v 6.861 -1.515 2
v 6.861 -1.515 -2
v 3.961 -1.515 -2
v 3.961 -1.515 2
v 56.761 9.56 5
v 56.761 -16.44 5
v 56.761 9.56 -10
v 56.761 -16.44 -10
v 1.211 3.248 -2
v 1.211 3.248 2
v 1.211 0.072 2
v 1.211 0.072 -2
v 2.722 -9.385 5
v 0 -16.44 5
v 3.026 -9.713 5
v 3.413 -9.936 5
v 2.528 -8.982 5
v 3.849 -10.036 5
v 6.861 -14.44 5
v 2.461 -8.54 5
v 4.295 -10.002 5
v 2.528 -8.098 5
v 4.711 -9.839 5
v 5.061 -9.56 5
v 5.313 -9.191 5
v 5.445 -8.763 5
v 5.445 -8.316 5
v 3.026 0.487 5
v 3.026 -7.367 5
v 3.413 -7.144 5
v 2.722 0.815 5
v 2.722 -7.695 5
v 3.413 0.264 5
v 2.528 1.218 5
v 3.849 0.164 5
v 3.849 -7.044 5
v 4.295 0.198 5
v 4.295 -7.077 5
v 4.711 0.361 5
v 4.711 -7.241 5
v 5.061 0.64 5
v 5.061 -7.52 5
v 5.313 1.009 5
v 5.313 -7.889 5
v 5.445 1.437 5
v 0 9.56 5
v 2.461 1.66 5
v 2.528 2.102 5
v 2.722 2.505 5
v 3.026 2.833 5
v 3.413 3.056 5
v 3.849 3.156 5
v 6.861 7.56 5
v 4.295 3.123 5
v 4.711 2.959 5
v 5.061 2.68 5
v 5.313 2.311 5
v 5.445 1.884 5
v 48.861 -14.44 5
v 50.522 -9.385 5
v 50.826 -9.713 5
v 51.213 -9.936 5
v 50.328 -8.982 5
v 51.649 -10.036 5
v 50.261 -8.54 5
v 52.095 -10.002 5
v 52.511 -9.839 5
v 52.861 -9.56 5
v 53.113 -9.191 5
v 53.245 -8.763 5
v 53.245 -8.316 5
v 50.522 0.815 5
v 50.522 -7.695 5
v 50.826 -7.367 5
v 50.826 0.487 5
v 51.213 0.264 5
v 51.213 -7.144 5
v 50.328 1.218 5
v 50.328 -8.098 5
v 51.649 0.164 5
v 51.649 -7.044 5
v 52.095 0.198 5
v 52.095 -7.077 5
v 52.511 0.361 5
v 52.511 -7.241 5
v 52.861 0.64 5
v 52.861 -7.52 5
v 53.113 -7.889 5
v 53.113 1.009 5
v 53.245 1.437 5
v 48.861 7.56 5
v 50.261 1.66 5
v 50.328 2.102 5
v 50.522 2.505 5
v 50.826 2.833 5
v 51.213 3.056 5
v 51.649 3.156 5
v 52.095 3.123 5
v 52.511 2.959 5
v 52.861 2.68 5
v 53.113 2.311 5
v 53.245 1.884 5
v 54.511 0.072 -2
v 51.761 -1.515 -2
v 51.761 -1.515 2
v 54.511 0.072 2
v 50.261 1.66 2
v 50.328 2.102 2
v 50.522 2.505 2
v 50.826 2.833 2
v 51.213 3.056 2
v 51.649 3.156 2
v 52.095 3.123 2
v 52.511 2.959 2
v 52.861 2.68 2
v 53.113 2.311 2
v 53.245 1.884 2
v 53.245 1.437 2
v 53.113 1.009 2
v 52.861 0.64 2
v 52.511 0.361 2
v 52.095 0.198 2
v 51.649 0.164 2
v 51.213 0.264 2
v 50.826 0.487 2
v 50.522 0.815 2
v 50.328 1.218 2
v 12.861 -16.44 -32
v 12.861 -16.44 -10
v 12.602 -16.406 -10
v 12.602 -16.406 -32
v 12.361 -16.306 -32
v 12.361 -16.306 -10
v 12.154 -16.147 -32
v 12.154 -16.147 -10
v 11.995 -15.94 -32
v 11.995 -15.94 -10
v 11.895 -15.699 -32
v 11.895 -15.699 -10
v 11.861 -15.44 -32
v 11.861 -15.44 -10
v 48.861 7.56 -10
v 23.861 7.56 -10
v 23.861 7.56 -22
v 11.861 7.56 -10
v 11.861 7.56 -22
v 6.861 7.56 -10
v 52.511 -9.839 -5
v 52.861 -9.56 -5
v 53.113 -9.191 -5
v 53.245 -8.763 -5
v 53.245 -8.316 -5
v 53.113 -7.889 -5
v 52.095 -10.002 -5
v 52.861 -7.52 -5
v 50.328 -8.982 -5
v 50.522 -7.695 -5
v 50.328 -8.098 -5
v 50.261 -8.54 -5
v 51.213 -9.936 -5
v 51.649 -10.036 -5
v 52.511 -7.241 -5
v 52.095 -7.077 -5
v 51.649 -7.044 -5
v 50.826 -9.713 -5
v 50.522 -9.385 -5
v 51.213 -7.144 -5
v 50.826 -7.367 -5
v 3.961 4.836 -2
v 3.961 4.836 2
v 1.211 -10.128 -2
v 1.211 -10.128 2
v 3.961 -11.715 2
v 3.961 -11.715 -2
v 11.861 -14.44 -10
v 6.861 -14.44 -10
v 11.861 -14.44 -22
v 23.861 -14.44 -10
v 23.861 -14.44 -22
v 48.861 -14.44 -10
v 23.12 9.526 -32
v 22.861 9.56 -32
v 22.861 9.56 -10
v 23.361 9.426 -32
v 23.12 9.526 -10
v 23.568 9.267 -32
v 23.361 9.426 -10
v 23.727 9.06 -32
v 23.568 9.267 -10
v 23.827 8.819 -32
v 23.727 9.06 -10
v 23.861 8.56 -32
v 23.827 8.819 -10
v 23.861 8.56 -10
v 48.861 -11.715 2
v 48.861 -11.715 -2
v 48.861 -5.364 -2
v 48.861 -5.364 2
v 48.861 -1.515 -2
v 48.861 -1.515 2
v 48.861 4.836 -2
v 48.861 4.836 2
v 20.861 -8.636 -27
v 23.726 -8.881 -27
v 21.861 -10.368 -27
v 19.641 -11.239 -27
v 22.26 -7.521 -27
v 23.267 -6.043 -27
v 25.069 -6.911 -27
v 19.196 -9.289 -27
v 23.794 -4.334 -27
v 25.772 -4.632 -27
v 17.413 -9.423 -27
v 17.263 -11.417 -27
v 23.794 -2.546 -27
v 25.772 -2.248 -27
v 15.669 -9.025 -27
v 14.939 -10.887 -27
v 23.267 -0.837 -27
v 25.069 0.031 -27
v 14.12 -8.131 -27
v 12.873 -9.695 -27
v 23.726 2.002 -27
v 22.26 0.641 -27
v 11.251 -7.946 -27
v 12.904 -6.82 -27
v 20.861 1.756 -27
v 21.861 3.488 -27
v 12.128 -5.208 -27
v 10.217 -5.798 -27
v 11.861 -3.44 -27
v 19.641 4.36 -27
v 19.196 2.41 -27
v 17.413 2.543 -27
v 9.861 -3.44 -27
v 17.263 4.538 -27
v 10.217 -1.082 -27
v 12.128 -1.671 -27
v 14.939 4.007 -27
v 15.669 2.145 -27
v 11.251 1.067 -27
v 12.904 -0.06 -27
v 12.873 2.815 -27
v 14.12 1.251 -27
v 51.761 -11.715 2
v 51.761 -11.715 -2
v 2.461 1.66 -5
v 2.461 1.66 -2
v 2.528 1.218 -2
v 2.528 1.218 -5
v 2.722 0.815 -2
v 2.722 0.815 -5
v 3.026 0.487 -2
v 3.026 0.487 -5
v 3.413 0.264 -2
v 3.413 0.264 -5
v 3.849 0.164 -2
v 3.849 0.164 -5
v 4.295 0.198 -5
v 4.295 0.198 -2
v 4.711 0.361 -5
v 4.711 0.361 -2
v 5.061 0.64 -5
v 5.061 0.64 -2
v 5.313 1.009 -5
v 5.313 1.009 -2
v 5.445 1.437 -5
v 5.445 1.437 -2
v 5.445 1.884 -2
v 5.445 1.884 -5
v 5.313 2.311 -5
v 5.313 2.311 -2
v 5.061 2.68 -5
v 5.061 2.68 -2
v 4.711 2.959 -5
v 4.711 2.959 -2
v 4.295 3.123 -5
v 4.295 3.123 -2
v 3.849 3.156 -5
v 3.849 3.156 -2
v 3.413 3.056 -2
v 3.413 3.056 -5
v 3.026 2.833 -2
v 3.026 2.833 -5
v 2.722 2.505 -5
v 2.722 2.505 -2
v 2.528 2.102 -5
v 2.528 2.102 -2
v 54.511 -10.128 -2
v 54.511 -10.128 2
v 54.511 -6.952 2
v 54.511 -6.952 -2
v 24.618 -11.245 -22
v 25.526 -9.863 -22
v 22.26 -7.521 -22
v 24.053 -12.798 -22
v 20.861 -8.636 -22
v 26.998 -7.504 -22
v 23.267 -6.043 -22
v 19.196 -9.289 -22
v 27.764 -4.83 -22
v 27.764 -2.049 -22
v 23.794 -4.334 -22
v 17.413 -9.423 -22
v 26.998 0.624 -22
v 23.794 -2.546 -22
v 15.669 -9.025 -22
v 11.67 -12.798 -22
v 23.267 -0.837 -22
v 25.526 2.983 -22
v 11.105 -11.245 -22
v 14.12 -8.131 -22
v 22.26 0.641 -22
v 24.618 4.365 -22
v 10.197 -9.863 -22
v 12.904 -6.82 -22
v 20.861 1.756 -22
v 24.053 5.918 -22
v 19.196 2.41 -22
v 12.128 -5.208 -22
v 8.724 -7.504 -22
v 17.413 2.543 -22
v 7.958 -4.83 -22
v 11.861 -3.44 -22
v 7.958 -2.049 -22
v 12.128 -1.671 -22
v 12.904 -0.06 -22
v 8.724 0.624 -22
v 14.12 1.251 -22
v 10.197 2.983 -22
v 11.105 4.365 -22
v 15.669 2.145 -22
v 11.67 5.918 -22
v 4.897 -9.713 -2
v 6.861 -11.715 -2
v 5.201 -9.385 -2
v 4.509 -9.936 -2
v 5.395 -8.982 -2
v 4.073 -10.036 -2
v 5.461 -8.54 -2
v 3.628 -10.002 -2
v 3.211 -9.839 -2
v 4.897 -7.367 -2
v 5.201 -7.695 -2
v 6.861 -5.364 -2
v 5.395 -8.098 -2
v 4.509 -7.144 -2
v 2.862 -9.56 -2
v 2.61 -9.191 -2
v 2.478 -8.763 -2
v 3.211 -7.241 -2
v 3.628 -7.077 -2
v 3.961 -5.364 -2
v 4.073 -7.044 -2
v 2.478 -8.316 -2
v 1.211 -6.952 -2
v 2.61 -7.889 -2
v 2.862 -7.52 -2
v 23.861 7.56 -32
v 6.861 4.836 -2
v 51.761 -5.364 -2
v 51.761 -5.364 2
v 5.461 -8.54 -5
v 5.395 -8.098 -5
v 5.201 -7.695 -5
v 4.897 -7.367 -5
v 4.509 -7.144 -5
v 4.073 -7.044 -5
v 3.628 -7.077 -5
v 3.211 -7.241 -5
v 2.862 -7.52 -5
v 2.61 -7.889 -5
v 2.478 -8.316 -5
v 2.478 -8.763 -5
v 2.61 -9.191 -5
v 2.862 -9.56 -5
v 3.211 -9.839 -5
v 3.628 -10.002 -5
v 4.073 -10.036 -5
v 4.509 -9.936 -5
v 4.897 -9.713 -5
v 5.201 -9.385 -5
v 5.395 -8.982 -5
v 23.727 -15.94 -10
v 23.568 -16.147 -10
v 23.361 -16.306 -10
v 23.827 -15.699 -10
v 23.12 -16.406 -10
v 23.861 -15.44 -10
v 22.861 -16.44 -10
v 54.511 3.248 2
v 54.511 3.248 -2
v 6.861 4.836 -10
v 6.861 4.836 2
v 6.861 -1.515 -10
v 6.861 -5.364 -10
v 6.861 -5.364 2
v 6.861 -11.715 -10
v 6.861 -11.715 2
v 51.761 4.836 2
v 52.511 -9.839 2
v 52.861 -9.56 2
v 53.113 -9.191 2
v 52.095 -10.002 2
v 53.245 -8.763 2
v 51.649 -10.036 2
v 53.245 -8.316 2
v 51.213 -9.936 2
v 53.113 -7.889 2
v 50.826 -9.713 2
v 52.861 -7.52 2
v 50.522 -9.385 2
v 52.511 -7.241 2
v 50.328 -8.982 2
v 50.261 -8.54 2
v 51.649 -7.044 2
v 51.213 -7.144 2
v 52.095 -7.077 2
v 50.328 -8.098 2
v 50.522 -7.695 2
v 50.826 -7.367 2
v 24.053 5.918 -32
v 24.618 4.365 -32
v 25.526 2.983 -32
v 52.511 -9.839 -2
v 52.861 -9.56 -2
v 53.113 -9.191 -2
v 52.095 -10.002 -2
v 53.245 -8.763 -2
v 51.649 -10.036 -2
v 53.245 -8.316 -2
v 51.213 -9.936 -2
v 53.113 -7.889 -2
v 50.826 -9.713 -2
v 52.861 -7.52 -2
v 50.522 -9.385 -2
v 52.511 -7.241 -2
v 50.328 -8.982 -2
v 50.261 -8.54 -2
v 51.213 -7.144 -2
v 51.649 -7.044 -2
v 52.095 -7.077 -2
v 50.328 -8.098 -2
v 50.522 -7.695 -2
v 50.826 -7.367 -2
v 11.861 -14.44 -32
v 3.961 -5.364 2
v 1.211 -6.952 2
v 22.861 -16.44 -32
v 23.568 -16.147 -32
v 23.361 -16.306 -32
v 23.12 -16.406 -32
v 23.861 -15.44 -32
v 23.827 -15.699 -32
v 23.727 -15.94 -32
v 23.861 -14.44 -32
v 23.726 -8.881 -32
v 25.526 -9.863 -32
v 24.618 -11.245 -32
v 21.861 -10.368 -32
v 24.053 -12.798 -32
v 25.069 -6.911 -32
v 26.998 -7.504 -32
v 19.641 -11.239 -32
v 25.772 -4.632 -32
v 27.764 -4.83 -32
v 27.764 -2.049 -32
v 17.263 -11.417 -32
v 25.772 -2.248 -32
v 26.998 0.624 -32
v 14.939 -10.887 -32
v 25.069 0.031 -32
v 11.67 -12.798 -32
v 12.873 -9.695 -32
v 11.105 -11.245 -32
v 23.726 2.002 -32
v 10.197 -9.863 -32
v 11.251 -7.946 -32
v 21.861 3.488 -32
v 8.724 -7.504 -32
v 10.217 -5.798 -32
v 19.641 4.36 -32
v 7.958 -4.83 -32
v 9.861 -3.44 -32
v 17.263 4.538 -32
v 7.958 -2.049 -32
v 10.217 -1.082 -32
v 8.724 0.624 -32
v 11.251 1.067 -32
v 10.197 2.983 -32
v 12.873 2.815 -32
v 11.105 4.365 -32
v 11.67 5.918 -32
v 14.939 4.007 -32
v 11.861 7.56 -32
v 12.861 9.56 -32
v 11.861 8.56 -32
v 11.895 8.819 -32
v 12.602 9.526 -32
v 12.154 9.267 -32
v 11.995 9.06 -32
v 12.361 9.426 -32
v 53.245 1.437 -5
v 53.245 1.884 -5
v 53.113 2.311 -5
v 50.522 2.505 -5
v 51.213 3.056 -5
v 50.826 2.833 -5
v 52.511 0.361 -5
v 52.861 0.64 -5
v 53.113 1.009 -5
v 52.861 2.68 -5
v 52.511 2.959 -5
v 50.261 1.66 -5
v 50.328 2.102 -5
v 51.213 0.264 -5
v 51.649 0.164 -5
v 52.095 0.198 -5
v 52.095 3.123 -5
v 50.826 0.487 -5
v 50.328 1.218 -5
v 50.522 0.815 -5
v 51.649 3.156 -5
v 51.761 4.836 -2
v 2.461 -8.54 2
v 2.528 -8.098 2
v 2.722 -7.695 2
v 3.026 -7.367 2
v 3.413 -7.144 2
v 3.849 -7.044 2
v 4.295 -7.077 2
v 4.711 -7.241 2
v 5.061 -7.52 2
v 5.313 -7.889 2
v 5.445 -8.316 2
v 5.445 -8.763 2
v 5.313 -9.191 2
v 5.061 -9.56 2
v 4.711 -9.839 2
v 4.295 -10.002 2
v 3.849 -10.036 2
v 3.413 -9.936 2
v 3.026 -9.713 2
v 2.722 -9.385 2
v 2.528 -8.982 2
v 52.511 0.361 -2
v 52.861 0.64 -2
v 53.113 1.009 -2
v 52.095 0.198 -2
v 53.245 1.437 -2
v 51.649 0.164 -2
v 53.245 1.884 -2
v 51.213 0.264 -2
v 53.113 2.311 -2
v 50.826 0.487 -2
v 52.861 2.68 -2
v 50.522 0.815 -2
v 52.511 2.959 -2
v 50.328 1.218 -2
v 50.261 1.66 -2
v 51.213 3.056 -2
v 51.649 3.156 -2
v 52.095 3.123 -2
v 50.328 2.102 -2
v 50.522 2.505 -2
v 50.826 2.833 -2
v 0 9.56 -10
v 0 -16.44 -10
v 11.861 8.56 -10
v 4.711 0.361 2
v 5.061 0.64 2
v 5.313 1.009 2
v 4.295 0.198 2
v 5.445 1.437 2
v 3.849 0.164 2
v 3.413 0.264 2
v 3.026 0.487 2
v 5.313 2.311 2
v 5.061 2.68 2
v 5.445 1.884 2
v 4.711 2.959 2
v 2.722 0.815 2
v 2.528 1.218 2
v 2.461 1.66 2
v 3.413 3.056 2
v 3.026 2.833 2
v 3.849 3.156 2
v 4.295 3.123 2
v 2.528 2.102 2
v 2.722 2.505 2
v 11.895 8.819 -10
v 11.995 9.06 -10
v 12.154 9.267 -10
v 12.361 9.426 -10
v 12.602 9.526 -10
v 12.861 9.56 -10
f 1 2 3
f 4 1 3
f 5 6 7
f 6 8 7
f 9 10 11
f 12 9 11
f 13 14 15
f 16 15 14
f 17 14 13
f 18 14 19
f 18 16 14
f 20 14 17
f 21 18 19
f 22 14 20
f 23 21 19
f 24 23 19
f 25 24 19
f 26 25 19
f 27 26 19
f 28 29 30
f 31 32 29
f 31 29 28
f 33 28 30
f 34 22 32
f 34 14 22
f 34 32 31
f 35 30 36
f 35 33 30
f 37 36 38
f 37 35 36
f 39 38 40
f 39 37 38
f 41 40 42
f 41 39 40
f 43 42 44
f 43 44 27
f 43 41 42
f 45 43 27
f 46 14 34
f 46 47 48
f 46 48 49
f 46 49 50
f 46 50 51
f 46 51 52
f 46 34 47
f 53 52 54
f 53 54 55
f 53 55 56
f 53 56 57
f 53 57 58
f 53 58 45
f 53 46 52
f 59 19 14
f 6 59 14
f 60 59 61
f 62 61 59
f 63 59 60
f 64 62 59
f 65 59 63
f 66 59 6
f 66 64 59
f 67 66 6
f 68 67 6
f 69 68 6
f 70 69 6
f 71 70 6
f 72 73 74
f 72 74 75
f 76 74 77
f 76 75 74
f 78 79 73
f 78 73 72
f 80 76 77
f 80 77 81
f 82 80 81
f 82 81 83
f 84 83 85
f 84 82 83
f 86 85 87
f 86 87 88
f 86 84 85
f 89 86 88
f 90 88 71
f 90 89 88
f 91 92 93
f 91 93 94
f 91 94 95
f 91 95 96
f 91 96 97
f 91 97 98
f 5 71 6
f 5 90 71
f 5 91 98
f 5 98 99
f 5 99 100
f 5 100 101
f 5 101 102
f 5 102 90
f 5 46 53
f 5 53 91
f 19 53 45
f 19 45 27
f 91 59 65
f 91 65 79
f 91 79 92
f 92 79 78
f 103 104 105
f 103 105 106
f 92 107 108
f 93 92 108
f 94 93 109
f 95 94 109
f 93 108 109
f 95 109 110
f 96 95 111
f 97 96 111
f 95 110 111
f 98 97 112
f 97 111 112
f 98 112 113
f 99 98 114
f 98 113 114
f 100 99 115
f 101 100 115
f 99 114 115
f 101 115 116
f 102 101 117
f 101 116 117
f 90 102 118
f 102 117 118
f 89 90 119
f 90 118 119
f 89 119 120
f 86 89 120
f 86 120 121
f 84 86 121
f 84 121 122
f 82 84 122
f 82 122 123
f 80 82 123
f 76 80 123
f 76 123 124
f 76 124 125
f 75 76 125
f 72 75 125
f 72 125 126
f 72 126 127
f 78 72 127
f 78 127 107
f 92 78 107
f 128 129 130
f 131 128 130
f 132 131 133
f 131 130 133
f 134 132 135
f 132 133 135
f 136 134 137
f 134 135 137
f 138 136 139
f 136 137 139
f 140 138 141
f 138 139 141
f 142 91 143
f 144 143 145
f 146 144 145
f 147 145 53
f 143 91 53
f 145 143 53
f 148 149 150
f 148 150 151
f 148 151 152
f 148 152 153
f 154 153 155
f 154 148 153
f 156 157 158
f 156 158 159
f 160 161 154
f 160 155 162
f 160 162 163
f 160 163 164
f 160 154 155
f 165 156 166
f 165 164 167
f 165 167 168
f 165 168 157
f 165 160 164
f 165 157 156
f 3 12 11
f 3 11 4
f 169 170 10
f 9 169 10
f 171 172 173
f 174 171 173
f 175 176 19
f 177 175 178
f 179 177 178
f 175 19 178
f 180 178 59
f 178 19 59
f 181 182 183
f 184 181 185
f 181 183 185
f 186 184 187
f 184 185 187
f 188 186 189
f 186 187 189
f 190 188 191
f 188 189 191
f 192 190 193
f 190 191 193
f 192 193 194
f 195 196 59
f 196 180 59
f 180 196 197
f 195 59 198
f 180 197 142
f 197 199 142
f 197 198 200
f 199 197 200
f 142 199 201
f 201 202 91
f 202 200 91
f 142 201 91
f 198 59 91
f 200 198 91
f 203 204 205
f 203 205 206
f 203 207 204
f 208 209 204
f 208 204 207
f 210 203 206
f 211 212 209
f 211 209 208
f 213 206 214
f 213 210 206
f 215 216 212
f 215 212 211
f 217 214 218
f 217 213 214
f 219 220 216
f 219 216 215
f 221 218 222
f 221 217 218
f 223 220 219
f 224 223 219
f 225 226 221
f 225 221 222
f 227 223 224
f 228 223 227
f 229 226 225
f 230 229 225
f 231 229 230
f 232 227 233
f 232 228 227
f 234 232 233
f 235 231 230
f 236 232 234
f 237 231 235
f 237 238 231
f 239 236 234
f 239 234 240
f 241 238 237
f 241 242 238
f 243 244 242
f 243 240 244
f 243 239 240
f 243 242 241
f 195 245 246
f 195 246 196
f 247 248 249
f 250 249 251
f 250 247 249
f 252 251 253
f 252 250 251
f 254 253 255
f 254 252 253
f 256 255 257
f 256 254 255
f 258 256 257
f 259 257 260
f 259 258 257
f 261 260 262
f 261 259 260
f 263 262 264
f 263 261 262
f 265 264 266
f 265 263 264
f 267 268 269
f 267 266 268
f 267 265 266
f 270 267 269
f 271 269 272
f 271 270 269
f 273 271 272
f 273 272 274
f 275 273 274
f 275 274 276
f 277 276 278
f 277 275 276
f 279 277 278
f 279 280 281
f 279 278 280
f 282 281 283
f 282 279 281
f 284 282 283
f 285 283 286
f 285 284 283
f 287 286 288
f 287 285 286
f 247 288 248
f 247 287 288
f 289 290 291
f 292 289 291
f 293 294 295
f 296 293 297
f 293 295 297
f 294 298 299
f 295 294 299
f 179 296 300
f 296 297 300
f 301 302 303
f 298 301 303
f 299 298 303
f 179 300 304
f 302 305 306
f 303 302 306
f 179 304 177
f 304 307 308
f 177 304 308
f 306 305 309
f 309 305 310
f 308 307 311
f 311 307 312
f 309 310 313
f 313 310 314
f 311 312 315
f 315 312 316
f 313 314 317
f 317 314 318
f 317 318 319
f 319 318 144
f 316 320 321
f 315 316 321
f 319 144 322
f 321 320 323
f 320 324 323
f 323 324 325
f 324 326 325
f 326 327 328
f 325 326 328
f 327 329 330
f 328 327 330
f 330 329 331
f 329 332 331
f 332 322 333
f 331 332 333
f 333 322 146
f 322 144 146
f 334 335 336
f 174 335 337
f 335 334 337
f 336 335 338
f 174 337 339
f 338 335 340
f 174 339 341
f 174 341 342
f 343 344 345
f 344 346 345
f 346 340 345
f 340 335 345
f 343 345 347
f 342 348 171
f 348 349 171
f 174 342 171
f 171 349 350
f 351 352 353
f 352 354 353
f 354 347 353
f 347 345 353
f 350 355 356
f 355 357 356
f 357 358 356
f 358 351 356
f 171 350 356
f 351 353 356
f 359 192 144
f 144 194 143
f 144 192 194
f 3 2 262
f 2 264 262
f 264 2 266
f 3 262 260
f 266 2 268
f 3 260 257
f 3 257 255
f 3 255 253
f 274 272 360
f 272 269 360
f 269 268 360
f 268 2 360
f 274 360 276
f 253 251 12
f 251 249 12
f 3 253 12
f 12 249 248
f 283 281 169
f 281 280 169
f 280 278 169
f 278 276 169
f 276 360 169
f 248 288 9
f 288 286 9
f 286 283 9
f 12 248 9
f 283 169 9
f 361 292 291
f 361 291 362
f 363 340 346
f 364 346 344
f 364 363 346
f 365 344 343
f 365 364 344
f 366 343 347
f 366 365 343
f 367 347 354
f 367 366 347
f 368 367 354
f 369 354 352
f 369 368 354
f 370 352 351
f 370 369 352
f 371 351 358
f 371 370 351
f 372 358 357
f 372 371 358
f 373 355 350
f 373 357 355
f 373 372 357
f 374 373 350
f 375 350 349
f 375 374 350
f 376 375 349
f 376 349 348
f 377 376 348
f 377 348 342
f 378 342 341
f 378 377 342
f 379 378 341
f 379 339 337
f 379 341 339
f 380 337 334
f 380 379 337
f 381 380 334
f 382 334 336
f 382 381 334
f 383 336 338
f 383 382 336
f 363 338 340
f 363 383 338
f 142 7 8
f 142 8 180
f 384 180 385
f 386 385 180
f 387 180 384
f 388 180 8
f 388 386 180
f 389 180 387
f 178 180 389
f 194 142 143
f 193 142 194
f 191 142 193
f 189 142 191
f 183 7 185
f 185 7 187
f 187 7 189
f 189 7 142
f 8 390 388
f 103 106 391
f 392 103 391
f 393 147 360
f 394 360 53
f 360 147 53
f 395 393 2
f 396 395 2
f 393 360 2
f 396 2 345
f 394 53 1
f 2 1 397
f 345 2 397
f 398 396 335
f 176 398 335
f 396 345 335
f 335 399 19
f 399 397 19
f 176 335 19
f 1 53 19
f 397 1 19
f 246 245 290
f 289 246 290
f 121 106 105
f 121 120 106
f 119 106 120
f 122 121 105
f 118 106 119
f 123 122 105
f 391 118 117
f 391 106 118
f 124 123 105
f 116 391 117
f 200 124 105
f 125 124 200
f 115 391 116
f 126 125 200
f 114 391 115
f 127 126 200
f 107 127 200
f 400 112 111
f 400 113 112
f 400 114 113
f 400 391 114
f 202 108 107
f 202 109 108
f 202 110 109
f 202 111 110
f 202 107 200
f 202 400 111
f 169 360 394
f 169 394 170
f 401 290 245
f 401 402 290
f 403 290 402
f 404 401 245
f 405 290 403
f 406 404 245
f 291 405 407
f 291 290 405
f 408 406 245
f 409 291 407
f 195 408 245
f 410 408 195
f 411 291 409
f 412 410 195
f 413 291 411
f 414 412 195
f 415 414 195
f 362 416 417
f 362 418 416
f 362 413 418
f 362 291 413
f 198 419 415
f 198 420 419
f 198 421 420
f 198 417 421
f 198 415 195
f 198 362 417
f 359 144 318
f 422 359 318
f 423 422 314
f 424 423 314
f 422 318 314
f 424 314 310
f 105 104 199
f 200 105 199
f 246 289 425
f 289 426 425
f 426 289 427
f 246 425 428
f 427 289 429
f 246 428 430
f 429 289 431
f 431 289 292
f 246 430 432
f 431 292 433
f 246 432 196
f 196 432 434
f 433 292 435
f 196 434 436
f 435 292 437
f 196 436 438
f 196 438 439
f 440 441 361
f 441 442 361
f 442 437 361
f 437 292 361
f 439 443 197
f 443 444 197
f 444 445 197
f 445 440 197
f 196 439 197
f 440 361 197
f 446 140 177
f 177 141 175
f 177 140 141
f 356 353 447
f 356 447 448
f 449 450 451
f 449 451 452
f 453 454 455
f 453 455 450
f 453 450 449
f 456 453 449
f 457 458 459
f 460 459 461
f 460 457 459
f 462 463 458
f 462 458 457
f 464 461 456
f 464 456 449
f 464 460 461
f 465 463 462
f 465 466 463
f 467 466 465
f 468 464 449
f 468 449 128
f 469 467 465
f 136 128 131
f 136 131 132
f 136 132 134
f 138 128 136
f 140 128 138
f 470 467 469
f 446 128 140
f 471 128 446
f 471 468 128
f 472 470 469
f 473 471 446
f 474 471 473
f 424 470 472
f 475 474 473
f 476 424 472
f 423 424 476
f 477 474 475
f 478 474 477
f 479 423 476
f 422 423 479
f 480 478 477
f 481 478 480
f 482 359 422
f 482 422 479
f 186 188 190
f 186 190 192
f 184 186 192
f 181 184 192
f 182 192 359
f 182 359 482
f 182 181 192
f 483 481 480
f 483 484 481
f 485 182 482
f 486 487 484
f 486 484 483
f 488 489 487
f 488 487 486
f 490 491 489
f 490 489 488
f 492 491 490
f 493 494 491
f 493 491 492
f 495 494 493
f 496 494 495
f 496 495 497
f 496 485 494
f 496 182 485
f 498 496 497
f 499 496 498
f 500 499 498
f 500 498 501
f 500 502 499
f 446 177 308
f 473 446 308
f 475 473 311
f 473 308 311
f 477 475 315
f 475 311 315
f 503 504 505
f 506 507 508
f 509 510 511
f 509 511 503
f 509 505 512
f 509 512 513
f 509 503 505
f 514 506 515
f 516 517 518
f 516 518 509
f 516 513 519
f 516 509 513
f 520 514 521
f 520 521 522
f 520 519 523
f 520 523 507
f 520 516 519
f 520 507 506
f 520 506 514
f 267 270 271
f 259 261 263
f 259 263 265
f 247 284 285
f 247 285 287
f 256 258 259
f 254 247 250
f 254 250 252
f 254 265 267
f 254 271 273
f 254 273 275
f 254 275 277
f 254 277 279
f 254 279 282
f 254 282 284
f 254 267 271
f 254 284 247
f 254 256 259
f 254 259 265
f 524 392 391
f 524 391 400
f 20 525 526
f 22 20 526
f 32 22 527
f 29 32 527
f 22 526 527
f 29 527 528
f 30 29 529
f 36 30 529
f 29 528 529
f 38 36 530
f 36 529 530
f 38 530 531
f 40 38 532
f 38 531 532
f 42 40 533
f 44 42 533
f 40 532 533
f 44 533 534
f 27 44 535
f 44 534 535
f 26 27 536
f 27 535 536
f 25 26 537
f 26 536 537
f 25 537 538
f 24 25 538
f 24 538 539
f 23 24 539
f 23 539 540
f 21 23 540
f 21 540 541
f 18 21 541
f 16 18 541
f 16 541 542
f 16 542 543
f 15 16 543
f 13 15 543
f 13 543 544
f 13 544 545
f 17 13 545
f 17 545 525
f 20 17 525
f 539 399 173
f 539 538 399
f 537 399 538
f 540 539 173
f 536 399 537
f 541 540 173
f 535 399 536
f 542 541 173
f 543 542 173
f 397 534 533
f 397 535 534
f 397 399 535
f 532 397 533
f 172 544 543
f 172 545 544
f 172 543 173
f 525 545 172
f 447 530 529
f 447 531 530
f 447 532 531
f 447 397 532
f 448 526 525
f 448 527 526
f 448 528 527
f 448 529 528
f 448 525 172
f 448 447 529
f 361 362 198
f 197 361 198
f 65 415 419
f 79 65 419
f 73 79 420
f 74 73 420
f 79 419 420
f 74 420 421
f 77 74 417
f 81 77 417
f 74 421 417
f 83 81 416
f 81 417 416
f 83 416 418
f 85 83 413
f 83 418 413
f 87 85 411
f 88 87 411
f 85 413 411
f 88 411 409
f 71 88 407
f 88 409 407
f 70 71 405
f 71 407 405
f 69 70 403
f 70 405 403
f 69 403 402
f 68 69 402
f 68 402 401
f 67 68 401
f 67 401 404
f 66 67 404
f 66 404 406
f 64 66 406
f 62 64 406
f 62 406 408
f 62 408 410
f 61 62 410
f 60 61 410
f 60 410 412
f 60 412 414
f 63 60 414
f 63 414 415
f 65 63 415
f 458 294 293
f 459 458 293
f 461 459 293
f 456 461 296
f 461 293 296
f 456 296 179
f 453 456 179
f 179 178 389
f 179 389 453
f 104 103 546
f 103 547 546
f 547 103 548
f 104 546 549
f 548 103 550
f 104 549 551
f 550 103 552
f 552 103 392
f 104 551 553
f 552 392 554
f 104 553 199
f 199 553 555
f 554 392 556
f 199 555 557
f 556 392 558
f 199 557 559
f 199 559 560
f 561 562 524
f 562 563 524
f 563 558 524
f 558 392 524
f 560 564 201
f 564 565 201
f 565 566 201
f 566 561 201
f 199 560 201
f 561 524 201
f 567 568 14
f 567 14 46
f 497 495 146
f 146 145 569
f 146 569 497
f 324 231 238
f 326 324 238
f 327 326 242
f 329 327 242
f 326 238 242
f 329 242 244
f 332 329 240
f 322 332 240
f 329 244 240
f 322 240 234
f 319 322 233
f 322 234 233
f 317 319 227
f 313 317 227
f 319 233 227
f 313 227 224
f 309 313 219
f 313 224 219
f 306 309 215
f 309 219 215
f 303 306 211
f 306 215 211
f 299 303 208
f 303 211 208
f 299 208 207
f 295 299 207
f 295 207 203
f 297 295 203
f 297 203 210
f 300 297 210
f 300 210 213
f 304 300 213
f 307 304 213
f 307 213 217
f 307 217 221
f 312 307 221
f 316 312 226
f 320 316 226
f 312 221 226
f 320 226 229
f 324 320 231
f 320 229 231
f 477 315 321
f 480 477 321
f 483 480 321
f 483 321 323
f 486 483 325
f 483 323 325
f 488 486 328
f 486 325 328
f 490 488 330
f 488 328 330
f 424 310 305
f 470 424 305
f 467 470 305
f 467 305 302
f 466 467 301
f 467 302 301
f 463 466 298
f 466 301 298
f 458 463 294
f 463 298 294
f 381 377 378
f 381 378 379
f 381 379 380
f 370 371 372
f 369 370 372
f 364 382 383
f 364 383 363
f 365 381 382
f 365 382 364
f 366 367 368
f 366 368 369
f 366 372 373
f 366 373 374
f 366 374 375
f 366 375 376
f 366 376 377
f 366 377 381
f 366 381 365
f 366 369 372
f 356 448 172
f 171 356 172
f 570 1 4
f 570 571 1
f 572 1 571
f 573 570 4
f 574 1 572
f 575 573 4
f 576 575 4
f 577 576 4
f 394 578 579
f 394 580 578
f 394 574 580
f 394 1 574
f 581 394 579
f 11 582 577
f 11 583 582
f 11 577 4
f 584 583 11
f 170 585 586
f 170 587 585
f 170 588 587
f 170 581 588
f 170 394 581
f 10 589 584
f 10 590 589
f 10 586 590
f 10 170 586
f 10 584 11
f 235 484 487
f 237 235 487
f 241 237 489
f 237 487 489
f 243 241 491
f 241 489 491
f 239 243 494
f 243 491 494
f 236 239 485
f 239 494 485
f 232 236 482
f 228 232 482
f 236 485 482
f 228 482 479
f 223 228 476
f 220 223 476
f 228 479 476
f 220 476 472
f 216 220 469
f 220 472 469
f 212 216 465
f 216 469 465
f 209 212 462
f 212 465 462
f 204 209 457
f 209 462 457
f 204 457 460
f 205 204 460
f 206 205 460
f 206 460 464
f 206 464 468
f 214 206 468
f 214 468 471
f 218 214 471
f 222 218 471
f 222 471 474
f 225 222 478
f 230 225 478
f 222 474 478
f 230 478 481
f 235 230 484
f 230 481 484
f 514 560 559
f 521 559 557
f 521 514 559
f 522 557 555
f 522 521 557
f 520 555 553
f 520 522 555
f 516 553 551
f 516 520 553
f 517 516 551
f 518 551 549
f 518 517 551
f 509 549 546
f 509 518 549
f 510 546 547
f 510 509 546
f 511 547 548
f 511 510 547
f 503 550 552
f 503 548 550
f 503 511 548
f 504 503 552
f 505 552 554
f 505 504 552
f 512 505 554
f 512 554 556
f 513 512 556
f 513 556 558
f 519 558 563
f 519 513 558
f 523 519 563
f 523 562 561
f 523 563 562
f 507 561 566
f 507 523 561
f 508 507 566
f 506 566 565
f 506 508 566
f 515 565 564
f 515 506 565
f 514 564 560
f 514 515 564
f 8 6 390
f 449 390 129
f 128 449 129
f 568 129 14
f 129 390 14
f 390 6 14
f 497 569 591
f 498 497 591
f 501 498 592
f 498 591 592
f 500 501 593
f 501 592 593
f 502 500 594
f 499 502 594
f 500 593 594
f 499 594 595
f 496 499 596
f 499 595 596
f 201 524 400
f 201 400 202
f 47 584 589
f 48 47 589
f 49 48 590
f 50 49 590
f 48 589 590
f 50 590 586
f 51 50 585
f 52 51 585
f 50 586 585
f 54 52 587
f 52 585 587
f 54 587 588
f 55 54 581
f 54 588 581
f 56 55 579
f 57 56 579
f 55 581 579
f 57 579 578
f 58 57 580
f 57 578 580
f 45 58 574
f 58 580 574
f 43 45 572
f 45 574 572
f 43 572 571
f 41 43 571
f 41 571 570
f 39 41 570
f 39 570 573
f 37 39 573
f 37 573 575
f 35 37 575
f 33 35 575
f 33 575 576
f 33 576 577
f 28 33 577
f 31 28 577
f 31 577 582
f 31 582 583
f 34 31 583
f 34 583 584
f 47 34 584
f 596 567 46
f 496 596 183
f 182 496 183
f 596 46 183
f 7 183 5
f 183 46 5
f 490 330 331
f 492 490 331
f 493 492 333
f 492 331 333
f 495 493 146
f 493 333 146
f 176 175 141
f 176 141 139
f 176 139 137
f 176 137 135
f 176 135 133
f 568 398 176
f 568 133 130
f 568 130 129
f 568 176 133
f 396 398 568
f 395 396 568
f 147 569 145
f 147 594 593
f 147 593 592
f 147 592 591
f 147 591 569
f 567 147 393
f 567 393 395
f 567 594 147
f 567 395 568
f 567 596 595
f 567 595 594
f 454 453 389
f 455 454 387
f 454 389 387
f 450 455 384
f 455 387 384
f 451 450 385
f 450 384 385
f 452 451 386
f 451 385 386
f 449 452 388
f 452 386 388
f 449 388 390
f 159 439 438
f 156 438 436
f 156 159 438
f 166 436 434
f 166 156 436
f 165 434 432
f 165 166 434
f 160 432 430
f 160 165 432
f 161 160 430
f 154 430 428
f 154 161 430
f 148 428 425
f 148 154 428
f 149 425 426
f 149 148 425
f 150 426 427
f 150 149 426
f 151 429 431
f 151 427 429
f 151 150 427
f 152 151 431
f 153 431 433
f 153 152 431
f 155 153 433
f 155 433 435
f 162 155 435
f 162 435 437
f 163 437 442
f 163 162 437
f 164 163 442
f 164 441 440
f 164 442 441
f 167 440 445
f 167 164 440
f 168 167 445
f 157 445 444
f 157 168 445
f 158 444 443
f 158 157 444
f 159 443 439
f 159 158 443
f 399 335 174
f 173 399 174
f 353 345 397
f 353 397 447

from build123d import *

# Parameters (mm, degrees)
ESQUISSE1_W                   = 80
ESQUISSE1_H                   = 26
BOSS_EXTRU_1_DEPTH            = 5
ESQUISSE4_W                   = 15
ESQUISSE4_H                   = 21
BOSS_EXTRU_2_DEPTH            = 23
ESQUISSE6_R                   = 1.9
ENL_V_MAT_EXTRU_1_DEPTH       = 23
ESQUISSE7_R                   = 2.5
ENL_V_MAT_EXTRU_2_DEPTH       = 33
ESQUISSE8_W                   = 23.844388633
ESQUISSE8_H                   = 15
ENL_V_MAT_EXTRU_3_DEPTH       = 20
ENL_V_MAT_EXTRU_4_DEPTH       = 20
ENL_V_MAT_EXTRU_5_DEPTH       = 25
ENL_V_MAT_EXTRU_7_DEPTH       = 25
ENL_V_MAT_EXTRU_8_DEPTH       = 1
BOSS_EXTRU_3_DEPTH            = 2
ESQUISSE15_R                  = 1.5
ENL_V_MAT_EXTRU_9_DEPTH       = 19
ESQUISSE17_W                  = 42
ESQUISSE17_H                  = 22
ENL_V_MAT_EXTRU_11_DEPTH      = 19
ENL_V_MAT_EXTRU_12_DEPTH      = 2
BOSS_EXTRU_4_DEPTH            = 22
BOSS_EXTRU_5_DEPTH            = 10
ESQUISSE25_R                  = 8
ENL_V_MAT_EXTRU_13_DEPTH      = 5
ESQUISSE26_R                  = 6
ENL_V_MAT_EXTRU_14_DEPTH      = 5
BOSS_EXTRU_7_DEPTH            = 10
ESQUISSE35_W                  = 3.859922035
ESQUISSE35_H                  = 6.350852961
ESQUISSE35_W_2                = 3.756368621
ESQUISSE35_W_3                = 10.8376001
ESQUISSE35_W_4                = 8.369035633
ENL_V_MAT_EXTRU_17_DEPTH      = 12
ESQUISSE37_W                  = 8.298839711
ESQUISSE37_H                  = 26
BOSS_EXTRU_8_DEPTH            = 8
BOSS_EXTRU_9_DEPTH            = 21
ENL_V_START                   = -10
ESQUISSE42_R                  = 1.5
ENL_V_MAT_EXTRU_18_DEPTH      = 10
ENL_V_MAT_EXTRU_19_DEPTH      = 70.721697714
ENL_V_MAT_EXTRU_19_DEPTH_BACK = 70.721697714
ESQUISSE43_W                  = 41.770498162
ESQUISSE43_H                  = 26


with BuildPart() as part:
    # Esquisse1 → Boss.-Extru.1 (new body)
    with BuildSketch(Plane.XY):
        with Locations((16.761307699, -3.439862543)):
            Rectangle(ESQUISSE1_W, ESQUISSE1_H)
    extrude(amount=BOSS_EXTRU_1_DEPTH)

    # Esquisse4 → Boss.-Extru.2 (add)
    with BuildSketch(Plane(origin=(0, 0, 0), x_dir=(-1, 0, 0), z_dir=(0, 0, -1))):
        with Locations((30.738692301, -3.439862543)):
            Rectangle(ESQUISSE4_W, ESQUISSE4_H)
    extrude(amount=-BOSS_EXTRU_2_DEPTH)

    # Esquisse6 → Enlèv. mat.-Extru.1 (cut)
    with BuildSketch(Plane.XZ.offset(13.939862543)):
        with Locations((-28.738692301, 5)):
            Circle(ESQUISSE6_R)
    extrude(amount=-ENL_V_MAT_EXTRU_1_DEPTH, mode=Mode.SUBTRACT)

    # Esquisse7 → Enlèv. mat.-Extru.2 (cut)
    with BuildSketch(Plane.XY.offset(23)):
        with Locations((-33.238692301, -3.439862543)):
            Circle(ESQUISSE7_R)
    extrude(amount=-ENL_V_MAT_EXTRU_2_DEPTH, mode=Mode.SUBTRACT)

    # Esquisse8 → Enlèv. mat.-Extru.3 (cut)
    with BuildSketch(Plane(origin=(0, 0, 0), x_dir=(-1, 0, 0), z_dir=(0, 0, -1))):
        with Locations((38.160886617, -3.439862543)):
            Rectangle(ESQUISSE8_W, ESQUISSE8_H)
    extrude(amount=-ENL_V_MAT_EXTRU_3_DEPTH, mode=Mode.SUBTRACT)

    # Esquisse9 → Enlèv. mat.-Extru.4 (cut)
    with BuildSketch(Plane(origin=(0, 0, 0), x_dir=(-1, 0, 0), z_dir=(0, 0, -1))):
        with BuildLine():
            Line((23.238692301, 7.060137457), (23.238692301, 9.560137457))
            Line((23.238692301, 9.560137457), (17.813492819, 9.560137457))
            ThreePointArc((17.813492819, 9.560137457), (20.800246467, 8.905073311), (23.238692301, 7.060137457))
        make_face()
        with BuildLine():
            Line((17.813492819, -16.439862543), (23.238692301, -16.439862543))
            Line((23.238692301, -16.439862543), (23.238692301, -13.939862543))
            ThreePointArc((23.238692301, -13.939862543), (20.800246467, -15.784798397), (17.813492819, -16.439862543))
        make_face()
    extrude(amount=-ENL_V_MAT_EXTRU_4_DEPTH, mode=Mode.SUBTRACT)

    # Esquisse10 → Enlèv. mat.-Extru.5 (cut)
    with BuildSketch(Plane.XZ.offset(13.939862543)):
        with BuildLine():
            Line((-23.238692301, 21.5), (-23.238692301, 23))
            Line((-23.238692301, 23), (-24.738692301, 23))
            ThreePointArc((-24.738692301, 23), (-23.678032129, 22.560660172), (-23.238692301, 21.5))
        make_face()
    extrude(amount=-ENL_V_MAT_EXTRU_5_DEPTH, mode=Mode.SUBTRACT)

    # Esquisse12 → Enlèv. mat.-Extru.7 (cut)
    with BuildSketch(Plane.XZ.offset(13.939862543)):
        with BuildLine():
            Line((-38.238692301, 23), (-36.738692301, 23))
            ThreePointArc((-36.738692301, 23), (-37.799352472, 22.560660172), (-38.238692301, 21.5))
            Line((-38.238692301, 21.5), (-38.238692301, 23))
        make_face()
    extrude(amount=-ENL_V_MAT_EXTRU_7_DEPTH, mode=Mode.SUBTRACT)

    # Esquisse13 → Enlèv. mat.-Extru.8 (cut)
    with BuildSketch(Plane(origin=(0, 7.060137457, 0), x_dir=(1, 0, 0), z_dir=(0, 1, 0))):
        Polygon((-30.759418243, -1.5), (-32.780144185, -5), (-30.759418243, -8.5), (-26.717966358, -8.5), (-24.697240416, -5), (-26.717966358, -1.5), align=None)
    extrude(amount=-ENL_V_MAT_EXTRU_8_DEPTH, mode=Mode.SUBTRACT)

    # Esquisse14 → Boss.-Extru.3 (add)
    with BuildSketch(Plane(origin=(0, 7.060137457, 0), x_dir=(1, 0, 0), z_dir=(0, 1, 0))):
        Polygon((-25.851940955, 0), (-31.625443646, 0), (-34.512194992, -5), (-31.625443646, -10), (-25.851940955, -10), (-23.238692301, -5.473720558), (-23.238692301, -4.526279442), align=None)
        Polygon((-30.759418243, -1.5), (-32.780144185, -5), (-30.759418243, -8.5), (-26.717966358, -8.5), (-24.697240416, -5), (-26.717966358, -1.5), align=None, mode=Mode.SUBTRACT)
    extrude(amount=BOSS_EXTRU_3_DEPTH)

    # Esquisse15 → Enlèv. mat.-Extru.9 (cut)
    with BuildSketch(Plane(origin=(0, 0, 0), x_dir=(-1, 0, 0), z_dir=(0, 0, -1))):
        with Locations((-51.761307699, -8.539862543)):
            Circle(ESQUISSE15_R)
        with Locations((-51.761307699, 1.660137457)):
            Circle(ESQUISSE15_R)
        with Locations((-3.961307699, -8.539862543)):
            Circle(ESQUISSE15_R)
        with Locations((-3.961307699, 1.660137457)):
            Circle(ESQUISSE15_R)
    extrude(amount=-ENL_V_MAT_EXTRU_9_DEPTH, mode=Mode.SUBTRACT)

    # Esquisse17 → Enlèv. mat.-Extru.11 (cut)
    with BuildSketch(Plane.XY.offset(5)):
        with Locations((27.861307699, -3.439862543)):
            Rectangle(ESQUISSE17_W, ESQUISSE17_H)
    extrude(amount=-ENL_V_MAT_EXTRU_11_DEPTH, mode=Mode.SUBTRACT)

    # Esquisse18 → Enlèv. mat.-Extru.12 (cut)
    with BuildSketch(Plane(origin=(0, 0, 0), x_dir=(-1, 0, 0), z_dir=(0, 0, -1))):
        Polygon((-49.011307699, 3.247850697), (-51.761307699, 4.835563938), (-54.511307699, 3.247850697), (-54.511307699, 0.072424217), (-51.761307699, -1.515289023), (-49.011307699, 0.072424217), (-46.261307699, 1.660137457), align=None)
        Polygon((-49.011307699, -6.952149303), (-51.761307699, -5.364436062), (-54.511307699, -6.952149303), (-54.511307699, -10.127575783), (-51.761307699, -11.715289023), (-49.011307699, -10.127575783), (-46.261307699, -8.539862543), align=None)
        Polygon((-6.711307699, 0.072424217), (-9.461307699, 1.660137457), (-6.711307699, 3.247850697), (-3.961307699, 4.835563938), (-1.211307699, 3.247850697), (-1.211307699, 0.072424217), (-3.961307699, -1.515289023), align=None)
        Polygon((-9.461307699, -8.539862543), (-6.711307699, -6.952149303), (-3.961307699, -5.364436062), (-1.211307699, -6.952149303), (-1.211307699, -10.127575783), (-3.961307699, -11.715289023), (-6.711307699, -10.127575783), align=None)
    extrude(amount=-ENL_V_MAT_EXTRU_12_DEPTH, mode=Mode.SUBTRACT)

    # Esquisse19 → Boss.-Extru.4 (add)
    with BuildSketch(Plane(origin=(0, 0, 0), x_dir=(-1, 0, 0), z_dir=(0, 0, -1))):
        with BuildLine():
            Line((-12.861307699, -16.439862543), (-22.861307699, -16.439862543))
            ThreePointArc((-22.861307699, -16.439862543), (-23.568414481, -16.146969324), (-23.861307699, -15.439862543))
            Line((-23.861307699, -15.439862543), (-23.861307699, -14.439862543))
            Line((-23.861307699, -14.439862543), (-11.861307699, -14.439862543))
            Line((-11.861307699, -14.439862543), (-11.861307699, -15.439862543))
            ThreePointArc((-11.861307699, -15.439862543), (-12.154200918, -16.146969324), (-12.861307699, -16.439862543))
        make_face()
        with BuildLine():
            Line((-23.861307699, 8.560137457), (-23.861307699, 7.560137457))
            Line((-23.861307699, 7.560137457), (-11.861307699, 7.560137457))
            Line((-11.861307699, 7.560137457), (-11.861307699, 8.560137457))
            ThreePointArc((-11.861307699, 8.560137457), (-12.154200918, 9.267244238), (-12.861307699, 9.560137457))
            Line((-12.861307699, 9.560137457), (-22.861307699, 9.560137457))
            ThreePointArc((-22.861307699, 9.560137457), (-23.568414481, 9.267244238), (-23.861307699, 8.560137457))
        make_face()
    extrude(amount=BOSS_EXTRU_4_DEPTH)

    # Esquisse23 → Boss.-Extru.5 (add)
    with BuildSketch(Plane(origin=(0, 0, -22), x_dir=(-1, 0, 0), z_dir=(0, 0, -1))):
        with BuildLine():
            Line((-23.861307699, 8.560137457), (-23.861307699, 7.560137457))
            ThreePointArc((-23.861307699, 7.560137457), (-24.290279557, 5.125218133), (-25.525541276, 2.983495121))
            ThreePointArc((-25.525541276, 2.983495121), (-27.861307699, -3.439862543), (-25.525541276, -9.863220207))
            ThreePointArc((-25.525541276, -9.863220207), (-24.290279557, -12.004943218), (-23.861307699, -14.439862543))
            Line((-23.861307699, -14.439862543), (-23.861307699, -15.439862543))
            ThreePointArc((-23.861307699, -15.439862543), (-23.568414481, -16.146969324), (-22.861307699, -16.439862543))
            Line((-22.861307699, -16.439862543), (-12.861307699, -16.439862543))
            ThreePointArc((-12.861307699, -16.439862543), (-12.154200918, -16.146969324), (-11.861307699, -15.439862543))
            Line((-11.861307699, -15.439862543), (-11.861307699, -14.439862543))
            ThreePointArc((-11.861307699, -14.439862543), (-11.432335842, -12.004943218), (-10.197074123, -9.863220207))
            ThreePointArc((-10.197074123, -9.863220207), (-7.861307699, -3.439862543), (-10.197074123, 2.983495121))
            ThreePointArc((-10.197074123, 2.983495121), (-11.432335842, 5.125218133), (-11.861307699, 7.560137457))
            Line((-11.861307699, 7.560137457), (-11.861307699, 8.560137457))
            ThreePointArc((-11.861307699, 8.560137457), (-12.154200918, 9.267244238), (-12.861307699, 9.560137457))
            Line((-12.861307699, 9.560137457), (-22.861307699, 9.560137457))
            ThreePointArc((-22.861307699, 9.560137457), (-23.568414481, 9.267244238), (-23.861307699, 8.560137457))
        make_face()
    extrude(amount=BOSS_EXTRU_5_DEPTH)

    # Esquisse25 → Enlèv. mat.-Extru.13 (cut)
    with BuildSketch(Plane(origin=(0, 0, -32), x_dir=(-1, 0, 0), z_dir=(0, 0, -1))):
        with Locations((-17.861307699, -3.439862543)):
            Circle(ESQUISSE25_R)
    extrude(amount=-ENL_V_MAT_EXTRU_13_DEPTH, mode=Mode.SUBTRACT)

    # Esquisse26 → Enlèv. mat.-Extru.14 (cut)
    with BuildSketch(Plane(origin=(0, 0, -27), x_dir=(-1, 0, 0), z_dir=(0, 0, -1))):
        with Locations((-17.861307699, -3.439862543)):
            Circle(ESQUISSE26_R)
    extrude(amount=-ENL_V_MAT_EXTRU_14_DEPTH, mode=Mode.SUBTRACT)

    # Esquisse33 → Boss.-Extru.7 (add)
    with BuildSketch(Plane(origin=(0, 0, 0), x_dir=(-1, 0, 0), z_dir=(0, 0, -1))):
        with BuildLine():
            Line((23.238692301, -13.939862543), (23.238692301, 7.060137457))
            ThreePointArc((23.238692301, 7.060137457), (20.800246467, 8.905073311), (17.813492819, 9.560137457))
            Line((17.813492819, 9.560137457), (-12.861307699, 9.560137457))
            ThreePointArc((-12.861307699, 9.560137457), (-12.154200918, 9.267244238), (-11.861307699, 8.560137457))
            Line((-11.861307699, 8.560137457), (-11.861307699, 7.560137457))
            Line((-11.861307699, 7.560137457), (-6.861307699, 7.560137457))
            Line((-6.861307699, 7.560137457), (-6.861307699, 3.161248157))
            Line((-6.861307699, 3.161248157), (-3.961307699, 4.835563938))
            Line((-3.961307699, 4.835563938), (-1.211307699, 3.247850697))
            Line((-1.211307699, 3.247850697), (-1.211307699, 0.072424217))
            Line((-1.211307699, 0.072424217), (-3.961307699, -1.515289023))
            Line((-3.961307699, -1.515289023), (-6.861307699, 0.159026757))
            Line((-6.861307699, 0.159026757), (-6.861307699, -7.038751843))
            Line((-6.861307699, -7.038751843), (-3.961307699, -5.364436062))
            Line((-3.961307699, -5.364436062), (-1.211307699, -6.952149303))
            Line((-1.211307699, -6.952149303), (-1.211307699, -10.127575783))
            Line((-1.211307699, -10.127575783), (-3.961307699, -11.715289023))
            Line((-3.961307699, -11.715289023), (-6.861307699, -10.040973243))
            Line((-6.861307699, -10.040973243), (-6.861307699, -14.439862543))
            Line((-6.861307699, -14.439862543), (-11.861307699, -14.439862543))
            Line((-11.861307699, -14.439862543), (-11.861307699, -15.439862543))
            ThreePointArc((-11.861307699, -15.439862543), (-12.154200918, -16.146969324), (-12.861307699, -16.439862543))
            Line((-12.861307699, -16.439862543), (17.813492819, -16.439862543))
            ThreePointArc((17.813492819, -16.439862543), (20.800246467, -15.784798397), (23.238692301, -13.939862543))
        make_face()
        with BuildLine():
            Line((-56.761307699, -16.439862543), (-22.861307699, -16.439862543))
            ThreePointArc((-22.861307699, -16.439862543), (-23.568414481, -16.146969324), (-23.861307699, -15.439862543))
            Line((-23.861307699, -15.439862543), (-23.861307699, -14.439862543))
            Line((-23.861307699, -14.439862543), (-48.861307699, -14.439862543))
            Line((-48.861307699, -14.439862543), (-48.861307699, -10.040973243))
            Line((-48.861307699, -10.040973243), (-51.761307699, -11.715289023))
            Line((-51.761307699, -11.715289023), (-54.511307699, -10.127575783))
            Line((-54.511307699, -10.127575783), (-54.511307699, -6.952149303))
            Line((-54.511307699, -6.952149303), (-51.761307699, -5.364436062))
            Line((-51.761307699, -5.364436062), (-48.861307699, -7.038751843))
            Line((-48.861307699, -7.038751843), (-48.861307699, 0.159026757))
            Line((-48.861307699, 0.159026757), (-51.761307699, -1.515289023))
            Line((-51.761307699, -1.515289023), (-54.511307699, 0.072424217))
            Line((-54.511307699, 0.072424217), (-54.511307699, 3.247850697))
            Line((-54.511307699, 3.247850697), (-51.761307699, 4.835563938))
            Line((-51.761307699, 4.835563938), (-48.861307699, 3.161248157))
            Line((-48.861307699, 3.161248157), (-48.861307699, 7.560137457))
            Line((-48.861307699, 7.560137457), (-23.861307699, 7.560137457))
            Line((-23.861307699, 7.560137457), (-23.861307699, 8.560137457))
            ThreePointArc((-23.861307699, 8.560137457), (-23.568414481, 9.267244238), (-22.861307699, 9.560137457))
            Line((-22.861307699, 9.560137457), (-56.761307699, 9.560137457))
            Line((-56.761307699, 9.560137457), (-56.761307699, -16.439862543))
        make_face()
    extrude(amount=BOSS_EXTRU_7_DEPTH)

    # Esquisse35 → Enlèv. mat.-Extru.17 (cut)
    with BuildSketch(Plane(origin=(0, 0, -10), x_dir=(-1, 0, 0), z_dir=(0, 0, -1))):
        with Locations((-5.891268716, 1.660137457)):
            Rectangle(ESQUISSE35_W, ESQUISSE35_H)
        with Locations((-5.83949201, -8.539862542)):
            Rectangle(ESQUISSE35_W_2, ESQUISSE35_H)
        with Locations((-46.342507649, 1.660137457)):
            Rectangle(ESQUISSE35_W_3, ESQUISSE35_H)
        with Locations((-47.576789883, -8.539862542)):
            Rectangle(ESQUISSE35_W_4, ESQUISSE35_H)
    extrude(amount=-ENL_V_MAT_EXTRU_17_DEPTH, mode=Mode.SUBTRACT)

    # Esquisse37 → Boss.-Extru.8 (add)
    with BuildSketch(Plane(origin=(0, 0, -10), x_dir=(-1, 0, 0), z_dir=(0, 0, -1))):
        Polygon((-55.51948102, 1.423088184), (-55.51948102, -7.920901253), (-55.066451899, -9.932075987), (-53.340761864, -11.715289023), (-48.861307699, -11.715289023), (-48.861307699, 4.835563938), (-52.662543063, 4.835563938), (-54.892065561, 3.297290773), align=None)
        with Locations((-2.711887844, -3.439862543)):
            Rectangle(ESQUISSE37_W, ESQUISSE37_H)
    extrude(amount=-BOSS_EXTRU_8_DEPTH)

    # Esquisse38 → Boss.-Extru.9 (add)
    with BuildSketch(Plane.XZ.offset(13.939862543)):
        with BuildLine():
            Line((-23.238692301, 21.5), (-23.238692301, 5))
            Line((-23.238692301, 5), (-6.738692301, 5))
            ThreePointArc((-6.738692301, 5), (-18.40595419, 9.83273811), (-23.238692301, 21.5))
        make_face()
    extrude(amount=-BOSS_EXTRU_9_DEPTH)

    # Esquisse42 → Enlèv. mat.-Extru.18 (cut)
    with BuildSketch(Plane.XY.offset(5).offset(ENL_V_START)):
        with Locations(Location((3.961307699, 1.660137457, 0), (0, 0, 180))):
            Circle(ESQUISSE42_R)
        with Locations((3.961307699, -8.539862543)):
            Circle(ESQUISSE42_R)
        with Locations(Location((51.761307699, 1.660137457, 0), (0, 0, 180))):
            Circle(ESQUISSE42_R)
        with Locations(Location((51.761307699, -8.539862543, 0), (0, 0, 180))):
            Circle(ESQUISSE42_R)
    extrude(amount=ENL_V_MAT_EXTRU_18_DEPTH, mode=Mode.SUBTRACT)

    # Esquisse43 → Enlèv. mat.-Extru.19 (cut, two sides: drawn at the far end of the back side and taken through both)
    with BuildSketch(Plane.XY.offset(5).offset(-ENL_V_MAT_EXTRU_19_DEPTH_BACK)):
        with Locations((-20.885249081, -3.439862543)):
            Rectangle(ESQUISSE43_W, ESQUISSE43_H)
    extrude(amount=ENL_V_MAT_EXTRU_19_DEPTH + ENL_V_MAT_EXTRU_19_DEPTH_BACK, mode=Mode.SUBTRACT)


solid = part.part
